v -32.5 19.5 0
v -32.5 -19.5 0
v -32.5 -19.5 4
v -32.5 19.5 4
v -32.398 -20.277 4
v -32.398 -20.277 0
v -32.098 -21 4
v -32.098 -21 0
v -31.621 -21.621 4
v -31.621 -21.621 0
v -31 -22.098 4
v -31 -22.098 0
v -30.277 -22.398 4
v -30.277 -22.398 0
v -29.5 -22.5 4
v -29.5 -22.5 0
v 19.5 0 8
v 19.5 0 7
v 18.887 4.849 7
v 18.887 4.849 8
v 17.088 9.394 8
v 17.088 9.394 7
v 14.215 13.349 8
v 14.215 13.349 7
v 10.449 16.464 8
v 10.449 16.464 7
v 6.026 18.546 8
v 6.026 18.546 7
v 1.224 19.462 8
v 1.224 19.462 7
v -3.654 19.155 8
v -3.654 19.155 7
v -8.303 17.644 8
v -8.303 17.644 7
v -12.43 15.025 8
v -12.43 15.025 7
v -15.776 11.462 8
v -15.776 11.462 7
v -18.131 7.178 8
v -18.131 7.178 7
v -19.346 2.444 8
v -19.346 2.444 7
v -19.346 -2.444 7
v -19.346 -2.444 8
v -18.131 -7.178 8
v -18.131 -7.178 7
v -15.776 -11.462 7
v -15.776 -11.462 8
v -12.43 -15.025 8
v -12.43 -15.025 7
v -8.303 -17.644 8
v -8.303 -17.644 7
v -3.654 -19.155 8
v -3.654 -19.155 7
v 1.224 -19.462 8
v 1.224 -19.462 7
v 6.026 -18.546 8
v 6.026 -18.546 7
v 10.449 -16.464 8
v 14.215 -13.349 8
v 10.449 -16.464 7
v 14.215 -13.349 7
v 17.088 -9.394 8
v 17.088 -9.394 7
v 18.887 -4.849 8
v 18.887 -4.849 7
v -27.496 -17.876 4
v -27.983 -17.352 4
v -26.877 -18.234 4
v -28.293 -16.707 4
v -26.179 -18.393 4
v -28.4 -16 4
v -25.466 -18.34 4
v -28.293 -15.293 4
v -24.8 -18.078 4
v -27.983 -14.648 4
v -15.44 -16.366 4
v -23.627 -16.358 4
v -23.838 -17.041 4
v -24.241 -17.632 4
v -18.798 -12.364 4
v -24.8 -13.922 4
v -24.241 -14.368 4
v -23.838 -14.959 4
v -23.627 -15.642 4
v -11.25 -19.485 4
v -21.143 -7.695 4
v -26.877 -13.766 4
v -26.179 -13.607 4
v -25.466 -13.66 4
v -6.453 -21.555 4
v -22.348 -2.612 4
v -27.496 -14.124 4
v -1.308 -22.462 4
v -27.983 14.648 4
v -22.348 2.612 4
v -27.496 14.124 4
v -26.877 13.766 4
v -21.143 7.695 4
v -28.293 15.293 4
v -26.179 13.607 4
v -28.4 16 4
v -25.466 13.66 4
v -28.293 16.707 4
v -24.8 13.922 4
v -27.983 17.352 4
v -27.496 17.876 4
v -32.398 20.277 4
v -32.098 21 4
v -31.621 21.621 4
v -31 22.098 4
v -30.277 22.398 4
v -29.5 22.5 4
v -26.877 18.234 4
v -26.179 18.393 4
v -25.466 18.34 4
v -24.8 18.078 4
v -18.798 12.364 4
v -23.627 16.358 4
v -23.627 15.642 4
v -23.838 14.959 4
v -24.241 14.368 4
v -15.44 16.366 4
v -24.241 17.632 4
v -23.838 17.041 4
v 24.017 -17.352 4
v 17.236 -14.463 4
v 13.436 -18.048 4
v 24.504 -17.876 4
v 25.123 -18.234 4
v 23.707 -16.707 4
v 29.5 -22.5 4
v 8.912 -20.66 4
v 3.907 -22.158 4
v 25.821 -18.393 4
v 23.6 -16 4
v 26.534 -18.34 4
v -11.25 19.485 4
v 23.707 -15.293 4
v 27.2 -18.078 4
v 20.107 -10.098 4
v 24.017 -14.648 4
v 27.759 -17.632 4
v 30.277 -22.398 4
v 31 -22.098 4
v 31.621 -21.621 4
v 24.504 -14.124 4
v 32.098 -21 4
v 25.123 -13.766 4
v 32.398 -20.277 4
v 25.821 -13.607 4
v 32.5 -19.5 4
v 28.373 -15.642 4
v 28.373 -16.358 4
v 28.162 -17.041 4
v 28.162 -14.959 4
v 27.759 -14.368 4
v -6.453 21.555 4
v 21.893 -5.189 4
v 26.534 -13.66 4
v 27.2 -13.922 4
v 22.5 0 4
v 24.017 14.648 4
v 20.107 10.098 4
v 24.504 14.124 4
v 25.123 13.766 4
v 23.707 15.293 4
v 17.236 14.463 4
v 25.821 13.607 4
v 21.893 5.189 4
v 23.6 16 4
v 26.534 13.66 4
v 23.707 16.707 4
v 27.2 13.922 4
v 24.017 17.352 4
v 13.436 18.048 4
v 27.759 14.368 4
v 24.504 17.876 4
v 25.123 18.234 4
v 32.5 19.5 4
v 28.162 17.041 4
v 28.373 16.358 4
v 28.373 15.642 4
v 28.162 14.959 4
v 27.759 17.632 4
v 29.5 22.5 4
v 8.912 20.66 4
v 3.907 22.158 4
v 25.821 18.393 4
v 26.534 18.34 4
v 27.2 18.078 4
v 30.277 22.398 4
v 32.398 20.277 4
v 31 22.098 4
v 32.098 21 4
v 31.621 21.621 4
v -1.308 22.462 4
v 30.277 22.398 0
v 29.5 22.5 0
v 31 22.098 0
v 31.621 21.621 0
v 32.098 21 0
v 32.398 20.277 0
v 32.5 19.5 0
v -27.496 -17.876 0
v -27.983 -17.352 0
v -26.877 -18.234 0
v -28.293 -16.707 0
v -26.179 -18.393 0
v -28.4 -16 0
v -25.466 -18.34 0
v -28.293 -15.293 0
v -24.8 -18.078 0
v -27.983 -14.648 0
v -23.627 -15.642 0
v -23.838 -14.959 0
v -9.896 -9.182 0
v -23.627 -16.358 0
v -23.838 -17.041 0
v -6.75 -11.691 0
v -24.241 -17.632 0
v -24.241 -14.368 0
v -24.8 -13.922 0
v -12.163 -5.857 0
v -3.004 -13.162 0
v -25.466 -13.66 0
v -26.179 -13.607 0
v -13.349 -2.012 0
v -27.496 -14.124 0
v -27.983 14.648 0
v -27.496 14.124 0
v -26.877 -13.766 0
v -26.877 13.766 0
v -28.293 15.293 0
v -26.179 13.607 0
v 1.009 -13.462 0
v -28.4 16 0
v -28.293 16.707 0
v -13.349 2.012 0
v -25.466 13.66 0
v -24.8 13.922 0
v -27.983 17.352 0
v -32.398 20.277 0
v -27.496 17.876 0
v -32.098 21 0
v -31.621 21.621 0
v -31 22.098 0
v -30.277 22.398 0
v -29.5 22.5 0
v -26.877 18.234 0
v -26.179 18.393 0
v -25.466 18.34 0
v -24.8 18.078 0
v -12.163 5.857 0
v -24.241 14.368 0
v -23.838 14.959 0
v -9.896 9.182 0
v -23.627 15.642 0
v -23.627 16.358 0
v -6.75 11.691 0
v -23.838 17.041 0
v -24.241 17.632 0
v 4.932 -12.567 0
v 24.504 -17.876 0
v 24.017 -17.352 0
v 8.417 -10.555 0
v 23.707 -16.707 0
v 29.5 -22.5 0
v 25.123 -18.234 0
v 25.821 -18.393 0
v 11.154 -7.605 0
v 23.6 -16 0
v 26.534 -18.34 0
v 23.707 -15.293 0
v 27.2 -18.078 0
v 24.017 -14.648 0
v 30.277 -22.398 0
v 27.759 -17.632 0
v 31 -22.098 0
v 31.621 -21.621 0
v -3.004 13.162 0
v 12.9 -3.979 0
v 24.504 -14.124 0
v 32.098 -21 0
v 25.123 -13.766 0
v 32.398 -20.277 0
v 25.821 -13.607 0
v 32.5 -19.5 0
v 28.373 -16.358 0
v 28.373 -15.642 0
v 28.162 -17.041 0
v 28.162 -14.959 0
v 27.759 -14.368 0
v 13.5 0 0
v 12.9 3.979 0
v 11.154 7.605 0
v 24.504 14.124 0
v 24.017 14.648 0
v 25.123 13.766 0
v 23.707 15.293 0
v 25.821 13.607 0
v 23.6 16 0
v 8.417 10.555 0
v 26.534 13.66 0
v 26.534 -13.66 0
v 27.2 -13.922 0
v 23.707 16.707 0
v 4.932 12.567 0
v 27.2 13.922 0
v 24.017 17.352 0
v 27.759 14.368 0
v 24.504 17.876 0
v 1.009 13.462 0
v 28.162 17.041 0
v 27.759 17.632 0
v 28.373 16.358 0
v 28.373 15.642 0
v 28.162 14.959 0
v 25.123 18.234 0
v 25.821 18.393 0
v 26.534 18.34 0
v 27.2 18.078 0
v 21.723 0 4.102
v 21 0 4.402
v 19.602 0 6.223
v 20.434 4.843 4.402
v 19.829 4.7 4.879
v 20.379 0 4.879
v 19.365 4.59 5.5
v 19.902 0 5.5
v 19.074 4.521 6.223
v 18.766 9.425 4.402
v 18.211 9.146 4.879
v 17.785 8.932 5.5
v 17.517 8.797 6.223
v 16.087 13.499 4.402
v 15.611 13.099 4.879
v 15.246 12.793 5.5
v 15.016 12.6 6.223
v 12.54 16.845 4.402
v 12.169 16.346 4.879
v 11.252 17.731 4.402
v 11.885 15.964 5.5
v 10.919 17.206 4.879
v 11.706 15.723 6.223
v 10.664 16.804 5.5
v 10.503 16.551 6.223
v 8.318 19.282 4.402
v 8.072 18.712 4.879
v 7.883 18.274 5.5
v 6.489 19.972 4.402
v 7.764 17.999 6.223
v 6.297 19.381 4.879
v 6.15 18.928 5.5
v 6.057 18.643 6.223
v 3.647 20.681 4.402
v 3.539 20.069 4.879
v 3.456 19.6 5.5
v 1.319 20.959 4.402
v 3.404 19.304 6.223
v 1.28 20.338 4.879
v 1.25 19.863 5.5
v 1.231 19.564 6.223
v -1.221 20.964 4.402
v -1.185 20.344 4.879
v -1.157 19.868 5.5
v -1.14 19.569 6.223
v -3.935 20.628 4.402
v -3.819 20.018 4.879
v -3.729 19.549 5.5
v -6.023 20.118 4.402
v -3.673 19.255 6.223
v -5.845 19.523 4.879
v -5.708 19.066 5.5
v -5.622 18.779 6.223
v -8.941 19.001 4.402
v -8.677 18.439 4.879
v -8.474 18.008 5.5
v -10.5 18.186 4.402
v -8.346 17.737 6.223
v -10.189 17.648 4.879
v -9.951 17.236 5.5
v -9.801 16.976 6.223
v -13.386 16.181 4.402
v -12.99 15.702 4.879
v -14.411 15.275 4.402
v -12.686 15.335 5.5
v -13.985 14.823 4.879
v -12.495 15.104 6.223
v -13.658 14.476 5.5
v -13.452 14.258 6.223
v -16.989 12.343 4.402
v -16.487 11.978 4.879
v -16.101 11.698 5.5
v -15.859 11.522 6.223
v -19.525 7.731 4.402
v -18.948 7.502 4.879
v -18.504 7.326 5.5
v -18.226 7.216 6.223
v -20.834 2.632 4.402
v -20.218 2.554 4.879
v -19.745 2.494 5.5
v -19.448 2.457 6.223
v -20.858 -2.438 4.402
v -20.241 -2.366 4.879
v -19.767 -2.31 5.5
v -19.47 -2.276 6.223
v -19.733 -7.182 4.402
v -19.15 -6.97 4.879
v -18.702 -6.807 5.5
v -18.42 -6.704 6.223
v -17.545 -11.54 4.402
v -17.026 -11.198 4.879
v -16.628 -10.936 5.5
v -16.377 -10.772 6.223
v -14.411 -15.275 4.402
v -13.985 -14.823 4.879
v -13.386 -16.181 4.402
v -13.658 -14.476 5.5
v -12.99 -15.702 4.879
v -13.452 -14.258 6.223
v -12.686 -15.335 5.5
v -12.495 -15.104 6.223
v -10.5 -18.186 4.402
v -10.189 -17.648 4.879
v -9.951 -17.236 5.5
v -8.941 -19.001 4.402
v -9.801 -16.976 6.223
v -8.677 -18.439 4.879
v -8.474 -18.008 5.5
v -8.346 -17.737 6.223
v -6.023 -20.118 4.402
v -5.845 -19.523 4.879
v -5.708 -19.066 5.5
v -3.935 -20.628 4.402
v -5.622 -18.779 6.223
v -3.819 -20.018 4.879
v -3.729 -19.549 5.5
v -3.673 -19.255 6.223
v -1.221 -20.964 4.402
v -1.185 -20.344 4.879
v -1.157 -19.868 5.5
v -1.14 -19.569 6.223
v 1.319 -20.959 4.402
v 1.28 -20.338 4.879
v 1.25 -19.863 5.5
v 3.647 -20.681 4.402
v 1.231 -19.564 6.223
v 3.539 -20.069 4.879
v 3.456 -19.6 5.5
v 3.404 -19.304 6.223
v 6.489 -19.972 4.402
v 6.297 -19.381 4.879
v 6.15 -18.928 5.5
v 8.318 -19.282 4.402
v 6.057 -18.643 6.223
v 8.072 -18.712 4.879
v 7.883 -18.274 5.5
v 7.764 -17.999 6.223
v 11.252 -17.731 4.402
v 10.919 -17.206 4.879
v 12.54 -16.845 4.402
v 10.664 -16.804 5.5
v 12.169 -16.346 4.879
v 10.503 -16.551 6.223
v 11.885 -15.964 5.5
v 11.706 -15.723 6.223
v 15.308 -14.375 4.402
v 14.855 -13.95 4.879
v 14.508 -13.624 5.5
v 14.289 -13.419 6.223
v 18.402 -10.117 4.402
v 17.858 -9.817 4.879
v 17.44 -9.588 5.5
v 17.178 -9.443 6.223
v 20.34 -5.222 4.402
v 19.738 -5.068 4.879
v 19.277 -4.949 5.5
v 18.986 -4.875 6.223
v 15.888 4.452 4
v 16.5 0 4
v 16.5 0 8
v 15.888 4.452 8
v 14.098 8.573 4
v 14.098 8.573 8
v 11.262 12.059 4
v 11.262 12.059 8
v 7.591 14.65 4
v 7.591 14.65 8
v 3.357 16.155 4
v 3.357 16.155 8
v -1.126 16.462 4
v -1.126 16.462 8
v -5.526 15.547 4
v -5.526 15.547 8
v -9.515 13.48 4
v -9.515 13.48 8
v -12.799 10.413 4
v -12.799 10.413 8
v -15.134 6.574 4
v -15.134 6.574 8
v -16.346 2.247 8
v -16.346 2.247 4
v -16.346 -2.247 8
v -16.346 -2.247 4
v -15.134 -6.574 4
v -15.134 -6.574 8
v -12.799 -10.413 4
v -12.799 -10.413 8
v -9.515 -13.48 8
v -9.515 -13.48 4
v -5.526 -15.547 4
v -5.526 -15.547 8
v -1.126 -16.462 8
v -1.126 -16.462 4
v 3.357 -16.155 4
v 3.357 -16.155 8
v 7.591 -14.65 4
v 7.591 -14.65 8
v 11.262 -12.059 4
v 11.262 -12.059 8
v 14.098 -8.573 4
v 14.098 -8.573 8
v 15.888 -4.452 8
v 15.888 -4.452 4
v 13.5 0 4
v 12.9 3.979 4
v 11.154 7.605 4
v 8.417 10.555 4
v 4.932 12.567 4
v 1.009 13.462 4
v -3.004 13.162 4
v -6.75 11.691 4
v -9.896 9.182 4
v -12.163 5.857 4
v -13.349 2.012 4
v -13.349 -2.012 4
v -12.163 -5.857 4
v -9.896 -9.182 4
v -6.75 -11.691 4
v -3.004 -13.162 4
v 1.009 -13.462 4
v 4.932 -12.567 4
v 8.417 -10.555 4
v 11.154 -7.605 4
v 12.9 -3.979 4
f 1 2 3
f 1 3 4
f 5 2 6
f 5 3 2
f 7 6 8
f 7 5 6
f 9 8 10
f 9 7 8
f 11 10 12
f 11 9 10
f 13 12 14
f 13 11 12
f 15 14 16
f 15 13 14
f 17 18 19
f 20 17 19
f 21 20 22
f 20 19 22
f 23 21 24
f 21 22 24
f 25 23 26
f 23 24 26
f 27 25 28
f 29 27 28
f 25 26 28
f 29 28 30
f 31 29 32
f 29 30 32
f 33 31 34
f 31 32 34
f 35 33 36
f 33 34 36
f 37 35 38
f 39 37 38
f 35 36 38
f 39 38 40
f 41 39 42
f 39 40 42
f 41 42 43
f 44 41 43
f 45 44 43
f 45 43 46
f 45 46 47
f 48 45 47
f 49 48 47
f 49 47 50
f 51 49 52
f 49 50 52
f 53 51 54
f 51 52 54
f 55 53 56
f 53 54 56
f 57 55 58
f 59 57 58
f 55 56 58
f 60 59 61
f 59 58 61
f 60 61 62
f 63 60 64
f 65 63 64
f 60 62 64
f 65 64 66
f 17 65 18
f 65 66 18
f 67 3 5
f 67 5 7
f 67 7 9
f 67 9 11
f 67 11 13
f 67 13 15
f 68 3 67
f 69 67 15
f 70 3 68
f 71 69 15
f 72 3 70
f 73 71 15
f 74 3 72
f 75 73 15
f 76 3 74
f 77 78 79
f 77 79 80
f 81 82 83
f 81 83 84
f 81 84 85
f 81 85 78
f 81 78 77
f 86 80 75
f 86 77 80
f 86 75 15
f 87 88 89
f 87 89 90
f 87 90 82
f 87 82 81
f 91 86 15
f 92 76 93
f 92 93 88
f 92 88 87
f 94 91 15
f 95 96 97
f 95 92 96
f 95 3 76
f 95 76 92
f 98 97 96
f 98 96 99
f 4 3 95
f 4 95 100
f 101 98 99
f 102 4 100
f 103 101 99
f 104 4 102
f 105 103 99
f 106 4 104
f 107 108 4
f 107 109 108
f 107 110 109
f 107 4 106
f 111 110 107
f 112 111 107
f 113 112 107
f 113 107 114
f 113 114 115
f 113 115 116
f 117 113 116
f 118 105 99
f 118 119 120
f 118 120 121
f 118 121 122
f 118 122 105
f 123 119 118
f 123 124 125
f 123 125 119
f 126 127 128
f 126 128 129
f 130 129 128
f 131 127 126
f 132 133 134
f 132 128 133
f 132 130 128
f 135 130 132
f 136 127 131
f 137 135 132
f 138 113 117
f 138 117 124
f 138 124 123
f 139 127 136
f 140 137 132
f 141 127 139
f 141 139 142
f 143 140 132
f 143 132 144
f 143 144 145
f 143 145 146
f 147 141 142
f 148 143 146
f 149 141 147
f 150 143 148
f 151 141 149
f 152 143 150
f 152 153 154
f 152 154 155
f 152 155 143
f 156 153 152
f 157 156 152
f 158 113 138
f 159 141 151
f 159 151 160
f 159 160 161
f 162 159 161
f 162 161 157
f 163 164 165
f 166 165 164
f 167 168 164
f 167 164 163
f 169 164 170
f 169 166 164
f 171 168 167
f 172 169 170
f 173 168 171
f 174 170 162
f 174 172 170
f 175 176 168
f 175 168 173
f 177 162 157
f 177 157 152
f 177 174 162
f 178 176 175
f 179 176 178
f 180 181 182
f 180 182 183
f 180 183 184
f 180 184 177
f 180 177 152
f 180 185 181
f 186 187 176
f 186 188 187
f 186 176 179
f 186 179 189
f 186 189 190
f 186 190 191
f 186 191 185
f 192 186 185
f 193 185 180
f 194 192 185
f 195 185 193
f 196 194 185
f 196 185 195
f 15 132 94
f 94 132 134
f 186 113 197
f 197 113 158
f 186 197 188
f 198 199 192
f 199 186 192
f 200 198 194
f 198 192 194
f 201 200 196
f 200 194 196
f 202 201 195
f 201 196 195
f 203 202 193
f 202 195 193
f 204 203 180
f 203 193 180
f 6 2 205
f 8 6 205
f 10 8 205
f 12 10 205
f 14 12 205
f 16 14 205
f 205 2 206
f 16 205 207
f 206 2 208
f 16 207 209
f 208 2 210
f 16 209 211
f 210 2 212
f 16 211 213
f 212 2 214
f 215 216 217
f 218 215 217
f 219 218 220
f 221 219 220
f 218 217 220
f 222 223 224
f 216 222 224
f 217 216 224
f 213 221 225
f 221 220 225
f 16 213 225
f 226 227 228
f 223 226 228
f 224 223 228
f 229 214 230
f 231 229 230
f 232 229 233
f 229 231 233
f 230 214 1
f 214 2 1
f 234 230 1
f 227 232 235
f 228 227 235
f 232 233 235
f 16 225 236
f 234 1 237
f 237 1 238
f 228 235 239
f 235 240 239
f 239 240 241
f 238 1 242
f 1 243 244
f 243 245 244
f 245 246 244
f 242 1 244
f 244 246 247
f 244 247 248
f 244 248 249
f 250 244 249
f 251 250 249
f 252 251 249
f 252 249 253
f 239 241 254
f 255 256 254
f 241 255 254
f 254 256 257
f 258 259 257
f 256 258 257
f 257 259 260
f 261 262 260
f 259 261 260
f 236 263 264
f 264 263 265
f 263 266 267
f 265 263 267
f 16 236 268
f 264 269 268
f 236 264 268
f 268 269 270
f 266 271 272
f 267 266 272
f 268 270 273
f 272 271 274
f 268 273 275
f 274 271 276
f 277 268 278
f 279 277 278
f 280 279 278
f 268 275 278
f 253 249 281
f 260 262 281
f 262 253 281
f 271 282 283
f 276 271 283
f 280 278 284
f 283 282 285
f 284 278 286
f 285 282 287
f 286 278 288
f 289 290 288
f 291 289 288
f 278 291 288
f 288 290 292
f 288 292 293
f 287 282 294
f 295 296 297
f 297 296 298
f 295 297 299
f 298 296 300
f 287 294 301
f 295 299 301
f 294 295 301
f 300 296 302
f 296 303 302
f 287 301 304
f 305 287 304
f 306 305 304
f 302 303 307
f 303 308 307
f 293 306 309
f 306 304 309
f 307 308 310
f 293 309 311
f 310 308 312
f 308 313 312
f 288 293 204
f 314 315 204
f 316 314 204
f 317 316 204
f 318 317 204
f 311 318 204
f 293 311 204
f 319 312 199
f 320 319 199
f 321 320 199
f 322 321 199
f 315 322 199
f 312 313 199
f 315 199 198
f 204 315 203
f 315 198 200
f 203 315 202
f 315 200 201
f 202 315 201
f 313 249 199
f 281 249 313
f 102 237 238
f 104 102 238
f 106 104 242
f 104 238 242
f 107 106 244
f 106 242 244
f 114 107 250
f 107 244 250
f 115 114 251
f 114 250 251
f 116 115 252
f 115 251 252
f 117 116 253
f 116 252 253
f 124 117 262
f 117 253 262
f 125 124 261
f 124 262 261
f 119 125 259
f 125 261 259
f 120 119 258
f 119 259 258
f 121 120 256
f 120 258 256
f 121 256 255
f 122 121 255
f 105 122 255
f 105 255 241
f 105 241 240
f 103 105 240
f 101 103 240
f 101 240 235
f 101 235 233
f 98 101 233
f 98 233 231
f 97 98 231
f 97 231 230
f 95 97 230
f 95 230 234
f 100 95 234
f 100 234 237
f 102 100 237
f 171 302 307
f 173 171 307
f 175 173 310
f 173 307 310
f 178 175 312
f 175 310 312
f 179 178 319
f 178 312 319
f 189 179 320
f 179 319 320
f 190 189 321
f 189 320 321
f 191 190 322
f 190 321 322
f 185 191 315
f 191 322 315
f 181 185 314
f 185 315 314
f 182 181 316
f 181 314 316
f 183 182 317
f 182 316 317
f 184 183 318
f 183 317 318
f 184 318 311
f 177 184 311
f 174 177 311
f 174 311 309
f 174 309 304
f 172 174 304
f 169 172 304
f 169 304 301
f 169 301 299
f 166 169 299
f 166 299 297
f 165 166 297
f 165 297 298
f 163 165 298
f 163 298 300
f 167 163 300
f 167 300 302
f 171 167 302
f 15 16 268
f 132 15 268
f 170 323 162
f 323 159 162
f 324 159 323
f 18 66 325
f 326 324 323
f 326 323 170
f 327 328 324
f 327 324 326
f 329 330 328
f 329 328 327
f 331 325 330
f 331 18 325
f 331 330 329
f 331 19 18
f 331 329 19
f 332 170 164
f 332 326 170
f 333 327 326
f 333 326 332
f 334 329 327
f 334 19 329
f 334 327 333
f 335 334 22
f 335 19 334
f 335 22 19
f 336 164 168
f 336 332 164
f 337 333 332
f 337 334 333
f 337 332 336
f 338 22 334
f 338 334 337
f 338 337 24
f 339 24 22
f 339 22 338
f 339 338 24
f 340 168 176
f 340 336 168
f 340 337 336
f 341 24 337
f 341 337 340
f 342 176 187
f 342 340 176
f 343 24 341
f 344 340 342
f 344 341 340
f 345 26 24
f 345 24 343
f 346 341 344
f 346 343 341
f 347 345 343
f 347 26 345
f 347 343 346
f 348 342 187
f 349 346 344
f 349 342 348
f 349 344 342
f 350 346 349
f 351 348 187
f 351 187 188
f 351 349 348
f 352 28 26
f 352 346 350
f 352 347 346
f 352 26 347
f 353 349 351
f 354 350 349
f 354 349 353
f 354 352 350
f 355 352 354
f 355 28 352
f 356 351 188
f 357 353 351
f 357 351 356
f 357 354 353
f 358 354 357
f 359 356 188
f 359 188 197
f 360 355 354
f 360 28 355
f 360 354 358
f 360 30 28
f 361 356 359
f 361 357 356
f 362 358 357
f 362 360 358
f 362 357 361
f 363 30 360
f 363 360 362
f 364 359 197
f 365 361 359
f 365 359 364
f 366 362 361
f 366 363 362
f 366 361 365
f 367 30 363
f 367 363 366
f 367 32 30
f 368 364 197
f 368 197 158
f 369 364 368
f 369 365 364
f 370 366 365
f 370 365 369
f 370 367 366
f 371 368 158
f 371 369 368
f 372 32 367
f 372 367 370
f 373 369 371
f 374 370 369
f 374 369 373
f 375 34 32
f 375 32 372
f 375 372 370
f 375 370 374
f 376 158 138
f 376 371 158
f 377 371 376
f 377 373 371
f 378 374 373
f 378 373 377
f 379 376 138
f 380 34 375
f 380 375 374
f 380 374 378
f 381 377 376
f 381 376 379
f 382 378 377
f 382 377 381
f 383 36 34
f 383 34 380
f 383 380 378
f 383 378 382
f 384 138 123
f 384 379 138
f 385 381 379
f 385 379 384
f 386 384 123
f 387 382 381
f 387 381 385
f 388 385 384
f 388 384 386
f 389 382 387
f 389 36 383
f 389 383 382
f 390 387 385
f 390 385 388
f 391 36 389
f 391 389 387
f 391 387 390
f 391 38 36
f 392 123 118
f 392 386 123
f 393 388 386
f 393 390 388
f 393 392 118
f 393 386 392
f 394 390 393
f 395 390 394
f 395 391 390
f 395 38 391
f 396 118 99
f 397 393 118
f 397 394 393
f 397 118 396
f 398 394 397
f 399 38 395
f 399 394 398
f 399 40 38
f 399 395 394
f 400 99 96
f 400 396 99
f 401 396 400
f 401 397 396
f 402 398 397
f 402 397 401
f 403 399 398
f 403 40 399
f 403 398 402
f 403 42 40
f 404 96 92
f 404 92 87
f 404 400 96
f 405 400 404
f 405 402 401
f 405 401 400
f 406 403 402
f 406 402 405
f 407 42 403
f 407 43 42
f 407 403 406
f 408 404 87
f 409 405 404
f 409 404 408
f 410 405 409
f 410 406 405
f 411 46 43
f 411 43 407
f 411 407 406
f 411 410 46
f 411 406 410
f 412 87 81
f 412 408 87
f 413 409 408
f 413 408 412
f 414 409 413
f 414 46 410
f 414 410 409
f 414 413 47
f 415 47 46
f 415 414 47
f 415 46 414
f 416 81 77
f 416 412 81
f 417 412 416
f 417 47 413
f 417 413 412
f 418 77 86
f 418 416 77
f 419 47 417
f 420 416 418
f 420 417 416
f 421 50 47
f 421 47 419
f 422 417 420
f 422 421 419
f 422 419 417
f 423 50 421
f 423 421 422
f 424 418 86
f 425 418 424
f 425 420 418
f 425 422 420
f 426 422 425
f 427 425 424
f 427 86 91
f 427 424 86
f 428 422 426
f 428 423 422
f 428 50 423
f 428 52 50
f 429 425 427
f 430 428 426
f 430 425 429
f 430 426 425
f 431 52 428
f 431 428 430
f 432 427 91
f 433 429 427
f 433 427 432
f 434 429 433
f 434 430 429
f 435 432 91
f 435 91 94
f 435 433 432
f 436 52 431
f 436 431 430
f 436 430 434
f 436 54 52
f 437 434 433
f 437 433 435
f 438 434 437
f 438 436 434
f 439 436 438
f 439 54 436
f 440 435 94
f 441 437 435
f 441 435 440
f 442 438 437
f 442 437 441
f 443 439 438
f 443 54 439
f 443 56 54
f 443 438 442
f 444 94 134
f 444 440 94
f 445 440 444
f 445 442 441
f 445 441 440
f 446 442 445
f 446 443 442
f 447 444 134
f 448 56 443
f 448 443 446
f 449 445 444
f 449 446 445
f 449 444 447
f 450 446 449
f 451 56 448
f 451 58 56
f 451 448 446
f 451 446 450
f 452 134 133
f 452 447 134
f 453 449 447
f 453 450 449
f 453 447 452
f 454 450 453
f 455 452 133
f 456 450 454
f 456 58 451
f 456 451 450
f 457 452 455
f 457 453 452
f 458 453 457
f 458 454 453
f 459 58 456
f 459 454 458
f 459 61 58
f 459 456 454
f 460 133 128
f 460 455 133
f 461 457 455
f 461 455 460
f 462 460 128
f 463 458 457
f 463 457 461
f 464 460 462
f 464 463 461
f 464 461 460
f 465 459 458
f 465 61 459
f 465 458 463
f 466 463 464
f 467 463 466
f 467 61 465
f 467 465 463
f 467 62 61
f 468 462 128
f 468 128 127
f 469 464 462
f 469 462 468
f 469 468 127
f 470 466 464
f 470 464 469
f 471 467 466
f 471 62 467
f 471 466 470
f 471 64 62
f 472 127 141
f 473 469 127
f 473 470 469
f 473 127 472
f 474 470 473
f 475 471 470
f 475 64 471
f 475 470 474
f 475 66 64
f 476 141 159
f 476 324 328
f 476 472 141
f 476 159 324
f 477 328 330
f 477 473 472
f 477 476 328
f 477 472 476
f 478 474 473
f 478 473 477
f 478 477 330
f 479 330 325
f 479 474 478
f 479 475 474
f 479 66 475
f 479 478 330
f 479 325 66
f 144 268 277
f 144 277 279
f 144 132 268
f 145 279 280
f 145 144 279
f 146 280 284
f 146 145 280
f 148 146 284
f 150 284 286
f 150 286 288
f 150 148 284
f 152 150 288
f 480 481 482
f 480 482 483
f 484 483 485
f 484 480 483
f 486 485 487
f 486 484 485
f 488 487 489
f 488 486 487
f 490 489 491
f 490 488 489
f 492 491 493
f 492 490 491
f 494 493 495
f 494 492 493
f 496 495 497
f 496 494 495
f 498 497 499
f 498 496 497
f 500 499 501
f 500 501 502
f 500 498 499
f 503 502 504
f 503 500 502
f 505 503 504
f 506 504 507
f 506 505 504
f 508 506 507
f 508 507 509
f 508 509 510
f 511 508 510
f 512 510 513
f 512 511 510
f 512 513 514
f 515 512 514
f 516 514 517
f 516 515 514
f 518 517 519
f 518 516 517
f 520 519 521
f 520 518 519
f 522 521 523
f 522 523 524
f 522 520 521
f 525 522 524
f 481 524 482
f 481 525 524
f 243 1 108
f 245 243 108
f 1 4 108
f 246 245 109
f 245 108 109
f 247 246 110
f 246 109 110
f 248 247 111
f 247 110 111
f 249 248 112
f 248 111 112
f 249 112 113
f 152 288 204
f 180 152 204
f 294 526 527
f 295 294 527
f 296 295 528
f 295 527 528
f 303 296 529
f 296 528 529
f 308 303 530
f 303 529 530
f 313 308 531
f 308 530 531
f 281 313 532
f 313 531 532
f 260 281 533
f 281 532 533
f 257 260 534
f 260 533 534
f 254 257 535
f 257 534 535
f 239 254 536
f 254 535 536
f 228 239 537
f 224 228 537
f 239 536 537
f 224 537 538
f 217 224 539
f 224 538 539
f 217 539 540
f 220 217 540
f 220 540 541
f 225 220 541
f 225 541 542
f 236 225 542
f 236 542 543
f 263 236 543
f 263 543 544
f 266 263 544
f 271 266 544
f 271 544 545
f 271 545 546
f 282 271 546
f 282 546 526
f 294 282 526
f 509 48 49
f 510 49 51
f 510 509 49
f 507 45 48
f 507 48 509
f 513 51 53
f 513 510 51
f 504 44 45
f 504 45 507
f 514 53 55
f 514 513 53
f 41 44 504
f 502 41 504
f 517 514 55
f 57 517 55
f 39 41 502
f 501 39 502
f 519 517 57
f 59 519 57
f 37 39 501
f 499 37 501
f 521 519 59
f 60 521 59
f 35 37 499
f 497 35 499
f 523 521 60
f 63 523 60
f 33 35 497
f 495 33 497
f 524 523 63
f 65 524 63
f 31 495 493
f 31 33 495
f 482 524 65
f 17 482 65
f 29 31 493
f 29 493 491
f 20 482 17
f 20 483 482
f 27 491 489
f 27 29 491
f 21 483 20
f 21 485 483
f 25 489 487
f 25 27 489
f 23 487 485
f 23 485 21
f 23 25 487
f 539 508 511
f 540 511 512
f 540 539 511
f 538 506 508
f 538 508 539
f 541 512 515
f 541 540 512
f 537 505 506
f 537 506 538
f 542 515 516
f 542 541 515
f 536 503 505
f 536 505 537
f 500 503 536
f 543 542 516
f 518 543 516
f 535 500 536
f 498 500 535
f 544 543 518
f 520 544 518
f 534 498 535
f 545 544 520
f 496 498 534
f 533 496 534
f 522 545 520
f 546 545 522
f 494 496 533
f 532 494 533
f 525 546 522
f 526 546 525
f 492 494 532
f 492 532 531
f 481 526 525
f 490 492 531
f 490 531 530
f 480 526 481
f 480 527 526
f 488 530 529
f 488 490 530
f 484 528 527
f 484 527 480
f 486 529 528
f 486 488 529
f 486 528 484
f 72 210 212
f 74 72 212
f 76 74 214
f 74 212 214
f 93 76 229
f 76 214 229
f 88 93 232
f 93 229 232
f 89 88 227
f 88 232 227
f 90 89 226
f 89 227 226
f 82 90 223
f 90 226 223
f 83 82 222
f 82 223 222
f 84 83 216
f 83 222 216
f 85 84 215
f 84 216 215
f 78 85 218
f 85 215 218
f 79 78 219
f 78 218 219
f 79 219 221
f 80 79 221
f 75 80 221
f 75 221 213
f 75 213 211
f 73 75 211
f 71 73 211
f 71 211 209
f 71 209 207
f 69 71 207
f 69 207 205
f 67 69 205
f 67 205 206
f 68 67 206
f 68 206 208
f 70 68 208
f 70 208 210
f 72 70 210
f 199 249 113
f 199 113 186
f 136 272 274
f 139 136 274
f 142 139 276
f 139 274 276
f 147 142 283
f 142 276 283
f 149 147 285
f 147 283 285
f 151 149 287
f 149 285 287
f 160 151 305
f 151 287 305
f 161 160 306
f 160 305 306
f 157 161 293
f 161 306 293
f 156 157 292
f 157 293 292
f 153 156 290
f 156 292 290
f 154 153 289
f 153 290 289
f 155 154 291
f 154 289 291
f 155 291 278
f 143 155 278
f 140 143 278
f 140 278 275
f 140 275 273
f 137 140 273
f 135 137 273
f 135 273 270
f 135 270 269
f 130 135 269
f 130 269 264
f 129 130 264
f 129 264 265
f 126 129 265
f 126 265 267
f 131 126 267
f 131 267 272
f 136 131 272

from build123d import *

# Parameters (mm, degrees)
SKETCH1_W            = 65
SKETCH1_H            = 45
SKETCH1_R            = 2
BOSS_EXTRUDE1_DEPTH  = 4
SKETCH4_R            = 19.5
SKETCH4_R_2          = 16.5
BOSS_EXTRUDE3_DEPTH  = 4
SKETCH5_R            = 13.5
CUT_EXTRUDE2_DEPTH   = 40.730341051
M4_CLEARANCE_HOLE1_D = 4.8
FILLET1_R            = 3


with BuildPart() as part:
    # Sketch1 → Boss-Extrude1 (new body)
    # profile 1 of 5: a face of its own
    with BuildSketch(Plane.XY):
        Rectangle(SKETCH1_W, SKETCH1_H)
        with Locations((26, 16)):
            Circle(SKETCH1_R, mode=Mode.SUBTRACT)
        with Locations((26, -16)):
            Circle(SKETCH1_R, mode=Mode.SUBTRACT)
        with Locations((-26, -16)):
            Circle(SKETCH1_R, mode=Mode.SUBTRACT)
        with Locations((-26, 16)):
            Circle(SKETCH1_R, mode=Mode.SUBTRACT)
    # profile 2 of 5: a face of its own
    with BuildSketch(Plane.XY):
        with Locations((-26, 16)):
            Circle(SKETCH1_R)
    # profile 3 of 5: a face of its own
    with BuildSketch(Plane.XY):
        with Locations((-26, -16)):
            Circle(SKETCH1_R)
    # profile 4 of 5: a face of its own
    with BuildSketch(Plane.XY):
        with Locations((26, -16)):
            Circle(SKETCH1_R)
    # profile 5 of 5: a face of its own
    with BuildSketch(Plane.XY):
        with Locations((26, 16)):
            Circle(SKETCH1_R)
    extrude(amount=BOSS_EXTRUDE1_DEPTH)

    # Sketch4 → Boss-Extrude3 (add)
    with BuildSketch(Plane.XY.offset(4)):
        Circle(SKETCH4_R)
        Circle(SKETCH4_R_2, mode=Mode.SUBTRACT)
    extrude(amount=BOSS_EXTRUDE3_DEPTH)

    # Sketch5 → Cut-Extrude2 (cut, through all)
    with BuildSketch(Plane.XY.offset(4)):
        Circle(SKETCH5_R)
    extrude(amount=-CUT_EXTRUDE2_DEPTH, mode=Mode.SUBTRACT)

    # M4 Clearance Hole1 (through all)
    with Locations(Plane.XY.offset(4)):
        with Locations((26, 16), (26, -16), (-26, -16), (-26, 16)):
            Hole(M4_CLEARANCE_HOLE1_D / 2)

    # Fillet1
    fillet1_edges = [part.edges().sort_by_distance(p)[0] for p in [
        (-19.5, 0, 4),
        (32.5, -22.5, 2),
        (-32.5, -22.5, 2),
        (-32.5, 22.5, 2),
        (32.5, 22.5, 2),
    ]]
    fillet(fillet1_edges, radius=FILLET1_R - 0.0001)  # a hair under: the kernel refuses the full size


solid = part.part
